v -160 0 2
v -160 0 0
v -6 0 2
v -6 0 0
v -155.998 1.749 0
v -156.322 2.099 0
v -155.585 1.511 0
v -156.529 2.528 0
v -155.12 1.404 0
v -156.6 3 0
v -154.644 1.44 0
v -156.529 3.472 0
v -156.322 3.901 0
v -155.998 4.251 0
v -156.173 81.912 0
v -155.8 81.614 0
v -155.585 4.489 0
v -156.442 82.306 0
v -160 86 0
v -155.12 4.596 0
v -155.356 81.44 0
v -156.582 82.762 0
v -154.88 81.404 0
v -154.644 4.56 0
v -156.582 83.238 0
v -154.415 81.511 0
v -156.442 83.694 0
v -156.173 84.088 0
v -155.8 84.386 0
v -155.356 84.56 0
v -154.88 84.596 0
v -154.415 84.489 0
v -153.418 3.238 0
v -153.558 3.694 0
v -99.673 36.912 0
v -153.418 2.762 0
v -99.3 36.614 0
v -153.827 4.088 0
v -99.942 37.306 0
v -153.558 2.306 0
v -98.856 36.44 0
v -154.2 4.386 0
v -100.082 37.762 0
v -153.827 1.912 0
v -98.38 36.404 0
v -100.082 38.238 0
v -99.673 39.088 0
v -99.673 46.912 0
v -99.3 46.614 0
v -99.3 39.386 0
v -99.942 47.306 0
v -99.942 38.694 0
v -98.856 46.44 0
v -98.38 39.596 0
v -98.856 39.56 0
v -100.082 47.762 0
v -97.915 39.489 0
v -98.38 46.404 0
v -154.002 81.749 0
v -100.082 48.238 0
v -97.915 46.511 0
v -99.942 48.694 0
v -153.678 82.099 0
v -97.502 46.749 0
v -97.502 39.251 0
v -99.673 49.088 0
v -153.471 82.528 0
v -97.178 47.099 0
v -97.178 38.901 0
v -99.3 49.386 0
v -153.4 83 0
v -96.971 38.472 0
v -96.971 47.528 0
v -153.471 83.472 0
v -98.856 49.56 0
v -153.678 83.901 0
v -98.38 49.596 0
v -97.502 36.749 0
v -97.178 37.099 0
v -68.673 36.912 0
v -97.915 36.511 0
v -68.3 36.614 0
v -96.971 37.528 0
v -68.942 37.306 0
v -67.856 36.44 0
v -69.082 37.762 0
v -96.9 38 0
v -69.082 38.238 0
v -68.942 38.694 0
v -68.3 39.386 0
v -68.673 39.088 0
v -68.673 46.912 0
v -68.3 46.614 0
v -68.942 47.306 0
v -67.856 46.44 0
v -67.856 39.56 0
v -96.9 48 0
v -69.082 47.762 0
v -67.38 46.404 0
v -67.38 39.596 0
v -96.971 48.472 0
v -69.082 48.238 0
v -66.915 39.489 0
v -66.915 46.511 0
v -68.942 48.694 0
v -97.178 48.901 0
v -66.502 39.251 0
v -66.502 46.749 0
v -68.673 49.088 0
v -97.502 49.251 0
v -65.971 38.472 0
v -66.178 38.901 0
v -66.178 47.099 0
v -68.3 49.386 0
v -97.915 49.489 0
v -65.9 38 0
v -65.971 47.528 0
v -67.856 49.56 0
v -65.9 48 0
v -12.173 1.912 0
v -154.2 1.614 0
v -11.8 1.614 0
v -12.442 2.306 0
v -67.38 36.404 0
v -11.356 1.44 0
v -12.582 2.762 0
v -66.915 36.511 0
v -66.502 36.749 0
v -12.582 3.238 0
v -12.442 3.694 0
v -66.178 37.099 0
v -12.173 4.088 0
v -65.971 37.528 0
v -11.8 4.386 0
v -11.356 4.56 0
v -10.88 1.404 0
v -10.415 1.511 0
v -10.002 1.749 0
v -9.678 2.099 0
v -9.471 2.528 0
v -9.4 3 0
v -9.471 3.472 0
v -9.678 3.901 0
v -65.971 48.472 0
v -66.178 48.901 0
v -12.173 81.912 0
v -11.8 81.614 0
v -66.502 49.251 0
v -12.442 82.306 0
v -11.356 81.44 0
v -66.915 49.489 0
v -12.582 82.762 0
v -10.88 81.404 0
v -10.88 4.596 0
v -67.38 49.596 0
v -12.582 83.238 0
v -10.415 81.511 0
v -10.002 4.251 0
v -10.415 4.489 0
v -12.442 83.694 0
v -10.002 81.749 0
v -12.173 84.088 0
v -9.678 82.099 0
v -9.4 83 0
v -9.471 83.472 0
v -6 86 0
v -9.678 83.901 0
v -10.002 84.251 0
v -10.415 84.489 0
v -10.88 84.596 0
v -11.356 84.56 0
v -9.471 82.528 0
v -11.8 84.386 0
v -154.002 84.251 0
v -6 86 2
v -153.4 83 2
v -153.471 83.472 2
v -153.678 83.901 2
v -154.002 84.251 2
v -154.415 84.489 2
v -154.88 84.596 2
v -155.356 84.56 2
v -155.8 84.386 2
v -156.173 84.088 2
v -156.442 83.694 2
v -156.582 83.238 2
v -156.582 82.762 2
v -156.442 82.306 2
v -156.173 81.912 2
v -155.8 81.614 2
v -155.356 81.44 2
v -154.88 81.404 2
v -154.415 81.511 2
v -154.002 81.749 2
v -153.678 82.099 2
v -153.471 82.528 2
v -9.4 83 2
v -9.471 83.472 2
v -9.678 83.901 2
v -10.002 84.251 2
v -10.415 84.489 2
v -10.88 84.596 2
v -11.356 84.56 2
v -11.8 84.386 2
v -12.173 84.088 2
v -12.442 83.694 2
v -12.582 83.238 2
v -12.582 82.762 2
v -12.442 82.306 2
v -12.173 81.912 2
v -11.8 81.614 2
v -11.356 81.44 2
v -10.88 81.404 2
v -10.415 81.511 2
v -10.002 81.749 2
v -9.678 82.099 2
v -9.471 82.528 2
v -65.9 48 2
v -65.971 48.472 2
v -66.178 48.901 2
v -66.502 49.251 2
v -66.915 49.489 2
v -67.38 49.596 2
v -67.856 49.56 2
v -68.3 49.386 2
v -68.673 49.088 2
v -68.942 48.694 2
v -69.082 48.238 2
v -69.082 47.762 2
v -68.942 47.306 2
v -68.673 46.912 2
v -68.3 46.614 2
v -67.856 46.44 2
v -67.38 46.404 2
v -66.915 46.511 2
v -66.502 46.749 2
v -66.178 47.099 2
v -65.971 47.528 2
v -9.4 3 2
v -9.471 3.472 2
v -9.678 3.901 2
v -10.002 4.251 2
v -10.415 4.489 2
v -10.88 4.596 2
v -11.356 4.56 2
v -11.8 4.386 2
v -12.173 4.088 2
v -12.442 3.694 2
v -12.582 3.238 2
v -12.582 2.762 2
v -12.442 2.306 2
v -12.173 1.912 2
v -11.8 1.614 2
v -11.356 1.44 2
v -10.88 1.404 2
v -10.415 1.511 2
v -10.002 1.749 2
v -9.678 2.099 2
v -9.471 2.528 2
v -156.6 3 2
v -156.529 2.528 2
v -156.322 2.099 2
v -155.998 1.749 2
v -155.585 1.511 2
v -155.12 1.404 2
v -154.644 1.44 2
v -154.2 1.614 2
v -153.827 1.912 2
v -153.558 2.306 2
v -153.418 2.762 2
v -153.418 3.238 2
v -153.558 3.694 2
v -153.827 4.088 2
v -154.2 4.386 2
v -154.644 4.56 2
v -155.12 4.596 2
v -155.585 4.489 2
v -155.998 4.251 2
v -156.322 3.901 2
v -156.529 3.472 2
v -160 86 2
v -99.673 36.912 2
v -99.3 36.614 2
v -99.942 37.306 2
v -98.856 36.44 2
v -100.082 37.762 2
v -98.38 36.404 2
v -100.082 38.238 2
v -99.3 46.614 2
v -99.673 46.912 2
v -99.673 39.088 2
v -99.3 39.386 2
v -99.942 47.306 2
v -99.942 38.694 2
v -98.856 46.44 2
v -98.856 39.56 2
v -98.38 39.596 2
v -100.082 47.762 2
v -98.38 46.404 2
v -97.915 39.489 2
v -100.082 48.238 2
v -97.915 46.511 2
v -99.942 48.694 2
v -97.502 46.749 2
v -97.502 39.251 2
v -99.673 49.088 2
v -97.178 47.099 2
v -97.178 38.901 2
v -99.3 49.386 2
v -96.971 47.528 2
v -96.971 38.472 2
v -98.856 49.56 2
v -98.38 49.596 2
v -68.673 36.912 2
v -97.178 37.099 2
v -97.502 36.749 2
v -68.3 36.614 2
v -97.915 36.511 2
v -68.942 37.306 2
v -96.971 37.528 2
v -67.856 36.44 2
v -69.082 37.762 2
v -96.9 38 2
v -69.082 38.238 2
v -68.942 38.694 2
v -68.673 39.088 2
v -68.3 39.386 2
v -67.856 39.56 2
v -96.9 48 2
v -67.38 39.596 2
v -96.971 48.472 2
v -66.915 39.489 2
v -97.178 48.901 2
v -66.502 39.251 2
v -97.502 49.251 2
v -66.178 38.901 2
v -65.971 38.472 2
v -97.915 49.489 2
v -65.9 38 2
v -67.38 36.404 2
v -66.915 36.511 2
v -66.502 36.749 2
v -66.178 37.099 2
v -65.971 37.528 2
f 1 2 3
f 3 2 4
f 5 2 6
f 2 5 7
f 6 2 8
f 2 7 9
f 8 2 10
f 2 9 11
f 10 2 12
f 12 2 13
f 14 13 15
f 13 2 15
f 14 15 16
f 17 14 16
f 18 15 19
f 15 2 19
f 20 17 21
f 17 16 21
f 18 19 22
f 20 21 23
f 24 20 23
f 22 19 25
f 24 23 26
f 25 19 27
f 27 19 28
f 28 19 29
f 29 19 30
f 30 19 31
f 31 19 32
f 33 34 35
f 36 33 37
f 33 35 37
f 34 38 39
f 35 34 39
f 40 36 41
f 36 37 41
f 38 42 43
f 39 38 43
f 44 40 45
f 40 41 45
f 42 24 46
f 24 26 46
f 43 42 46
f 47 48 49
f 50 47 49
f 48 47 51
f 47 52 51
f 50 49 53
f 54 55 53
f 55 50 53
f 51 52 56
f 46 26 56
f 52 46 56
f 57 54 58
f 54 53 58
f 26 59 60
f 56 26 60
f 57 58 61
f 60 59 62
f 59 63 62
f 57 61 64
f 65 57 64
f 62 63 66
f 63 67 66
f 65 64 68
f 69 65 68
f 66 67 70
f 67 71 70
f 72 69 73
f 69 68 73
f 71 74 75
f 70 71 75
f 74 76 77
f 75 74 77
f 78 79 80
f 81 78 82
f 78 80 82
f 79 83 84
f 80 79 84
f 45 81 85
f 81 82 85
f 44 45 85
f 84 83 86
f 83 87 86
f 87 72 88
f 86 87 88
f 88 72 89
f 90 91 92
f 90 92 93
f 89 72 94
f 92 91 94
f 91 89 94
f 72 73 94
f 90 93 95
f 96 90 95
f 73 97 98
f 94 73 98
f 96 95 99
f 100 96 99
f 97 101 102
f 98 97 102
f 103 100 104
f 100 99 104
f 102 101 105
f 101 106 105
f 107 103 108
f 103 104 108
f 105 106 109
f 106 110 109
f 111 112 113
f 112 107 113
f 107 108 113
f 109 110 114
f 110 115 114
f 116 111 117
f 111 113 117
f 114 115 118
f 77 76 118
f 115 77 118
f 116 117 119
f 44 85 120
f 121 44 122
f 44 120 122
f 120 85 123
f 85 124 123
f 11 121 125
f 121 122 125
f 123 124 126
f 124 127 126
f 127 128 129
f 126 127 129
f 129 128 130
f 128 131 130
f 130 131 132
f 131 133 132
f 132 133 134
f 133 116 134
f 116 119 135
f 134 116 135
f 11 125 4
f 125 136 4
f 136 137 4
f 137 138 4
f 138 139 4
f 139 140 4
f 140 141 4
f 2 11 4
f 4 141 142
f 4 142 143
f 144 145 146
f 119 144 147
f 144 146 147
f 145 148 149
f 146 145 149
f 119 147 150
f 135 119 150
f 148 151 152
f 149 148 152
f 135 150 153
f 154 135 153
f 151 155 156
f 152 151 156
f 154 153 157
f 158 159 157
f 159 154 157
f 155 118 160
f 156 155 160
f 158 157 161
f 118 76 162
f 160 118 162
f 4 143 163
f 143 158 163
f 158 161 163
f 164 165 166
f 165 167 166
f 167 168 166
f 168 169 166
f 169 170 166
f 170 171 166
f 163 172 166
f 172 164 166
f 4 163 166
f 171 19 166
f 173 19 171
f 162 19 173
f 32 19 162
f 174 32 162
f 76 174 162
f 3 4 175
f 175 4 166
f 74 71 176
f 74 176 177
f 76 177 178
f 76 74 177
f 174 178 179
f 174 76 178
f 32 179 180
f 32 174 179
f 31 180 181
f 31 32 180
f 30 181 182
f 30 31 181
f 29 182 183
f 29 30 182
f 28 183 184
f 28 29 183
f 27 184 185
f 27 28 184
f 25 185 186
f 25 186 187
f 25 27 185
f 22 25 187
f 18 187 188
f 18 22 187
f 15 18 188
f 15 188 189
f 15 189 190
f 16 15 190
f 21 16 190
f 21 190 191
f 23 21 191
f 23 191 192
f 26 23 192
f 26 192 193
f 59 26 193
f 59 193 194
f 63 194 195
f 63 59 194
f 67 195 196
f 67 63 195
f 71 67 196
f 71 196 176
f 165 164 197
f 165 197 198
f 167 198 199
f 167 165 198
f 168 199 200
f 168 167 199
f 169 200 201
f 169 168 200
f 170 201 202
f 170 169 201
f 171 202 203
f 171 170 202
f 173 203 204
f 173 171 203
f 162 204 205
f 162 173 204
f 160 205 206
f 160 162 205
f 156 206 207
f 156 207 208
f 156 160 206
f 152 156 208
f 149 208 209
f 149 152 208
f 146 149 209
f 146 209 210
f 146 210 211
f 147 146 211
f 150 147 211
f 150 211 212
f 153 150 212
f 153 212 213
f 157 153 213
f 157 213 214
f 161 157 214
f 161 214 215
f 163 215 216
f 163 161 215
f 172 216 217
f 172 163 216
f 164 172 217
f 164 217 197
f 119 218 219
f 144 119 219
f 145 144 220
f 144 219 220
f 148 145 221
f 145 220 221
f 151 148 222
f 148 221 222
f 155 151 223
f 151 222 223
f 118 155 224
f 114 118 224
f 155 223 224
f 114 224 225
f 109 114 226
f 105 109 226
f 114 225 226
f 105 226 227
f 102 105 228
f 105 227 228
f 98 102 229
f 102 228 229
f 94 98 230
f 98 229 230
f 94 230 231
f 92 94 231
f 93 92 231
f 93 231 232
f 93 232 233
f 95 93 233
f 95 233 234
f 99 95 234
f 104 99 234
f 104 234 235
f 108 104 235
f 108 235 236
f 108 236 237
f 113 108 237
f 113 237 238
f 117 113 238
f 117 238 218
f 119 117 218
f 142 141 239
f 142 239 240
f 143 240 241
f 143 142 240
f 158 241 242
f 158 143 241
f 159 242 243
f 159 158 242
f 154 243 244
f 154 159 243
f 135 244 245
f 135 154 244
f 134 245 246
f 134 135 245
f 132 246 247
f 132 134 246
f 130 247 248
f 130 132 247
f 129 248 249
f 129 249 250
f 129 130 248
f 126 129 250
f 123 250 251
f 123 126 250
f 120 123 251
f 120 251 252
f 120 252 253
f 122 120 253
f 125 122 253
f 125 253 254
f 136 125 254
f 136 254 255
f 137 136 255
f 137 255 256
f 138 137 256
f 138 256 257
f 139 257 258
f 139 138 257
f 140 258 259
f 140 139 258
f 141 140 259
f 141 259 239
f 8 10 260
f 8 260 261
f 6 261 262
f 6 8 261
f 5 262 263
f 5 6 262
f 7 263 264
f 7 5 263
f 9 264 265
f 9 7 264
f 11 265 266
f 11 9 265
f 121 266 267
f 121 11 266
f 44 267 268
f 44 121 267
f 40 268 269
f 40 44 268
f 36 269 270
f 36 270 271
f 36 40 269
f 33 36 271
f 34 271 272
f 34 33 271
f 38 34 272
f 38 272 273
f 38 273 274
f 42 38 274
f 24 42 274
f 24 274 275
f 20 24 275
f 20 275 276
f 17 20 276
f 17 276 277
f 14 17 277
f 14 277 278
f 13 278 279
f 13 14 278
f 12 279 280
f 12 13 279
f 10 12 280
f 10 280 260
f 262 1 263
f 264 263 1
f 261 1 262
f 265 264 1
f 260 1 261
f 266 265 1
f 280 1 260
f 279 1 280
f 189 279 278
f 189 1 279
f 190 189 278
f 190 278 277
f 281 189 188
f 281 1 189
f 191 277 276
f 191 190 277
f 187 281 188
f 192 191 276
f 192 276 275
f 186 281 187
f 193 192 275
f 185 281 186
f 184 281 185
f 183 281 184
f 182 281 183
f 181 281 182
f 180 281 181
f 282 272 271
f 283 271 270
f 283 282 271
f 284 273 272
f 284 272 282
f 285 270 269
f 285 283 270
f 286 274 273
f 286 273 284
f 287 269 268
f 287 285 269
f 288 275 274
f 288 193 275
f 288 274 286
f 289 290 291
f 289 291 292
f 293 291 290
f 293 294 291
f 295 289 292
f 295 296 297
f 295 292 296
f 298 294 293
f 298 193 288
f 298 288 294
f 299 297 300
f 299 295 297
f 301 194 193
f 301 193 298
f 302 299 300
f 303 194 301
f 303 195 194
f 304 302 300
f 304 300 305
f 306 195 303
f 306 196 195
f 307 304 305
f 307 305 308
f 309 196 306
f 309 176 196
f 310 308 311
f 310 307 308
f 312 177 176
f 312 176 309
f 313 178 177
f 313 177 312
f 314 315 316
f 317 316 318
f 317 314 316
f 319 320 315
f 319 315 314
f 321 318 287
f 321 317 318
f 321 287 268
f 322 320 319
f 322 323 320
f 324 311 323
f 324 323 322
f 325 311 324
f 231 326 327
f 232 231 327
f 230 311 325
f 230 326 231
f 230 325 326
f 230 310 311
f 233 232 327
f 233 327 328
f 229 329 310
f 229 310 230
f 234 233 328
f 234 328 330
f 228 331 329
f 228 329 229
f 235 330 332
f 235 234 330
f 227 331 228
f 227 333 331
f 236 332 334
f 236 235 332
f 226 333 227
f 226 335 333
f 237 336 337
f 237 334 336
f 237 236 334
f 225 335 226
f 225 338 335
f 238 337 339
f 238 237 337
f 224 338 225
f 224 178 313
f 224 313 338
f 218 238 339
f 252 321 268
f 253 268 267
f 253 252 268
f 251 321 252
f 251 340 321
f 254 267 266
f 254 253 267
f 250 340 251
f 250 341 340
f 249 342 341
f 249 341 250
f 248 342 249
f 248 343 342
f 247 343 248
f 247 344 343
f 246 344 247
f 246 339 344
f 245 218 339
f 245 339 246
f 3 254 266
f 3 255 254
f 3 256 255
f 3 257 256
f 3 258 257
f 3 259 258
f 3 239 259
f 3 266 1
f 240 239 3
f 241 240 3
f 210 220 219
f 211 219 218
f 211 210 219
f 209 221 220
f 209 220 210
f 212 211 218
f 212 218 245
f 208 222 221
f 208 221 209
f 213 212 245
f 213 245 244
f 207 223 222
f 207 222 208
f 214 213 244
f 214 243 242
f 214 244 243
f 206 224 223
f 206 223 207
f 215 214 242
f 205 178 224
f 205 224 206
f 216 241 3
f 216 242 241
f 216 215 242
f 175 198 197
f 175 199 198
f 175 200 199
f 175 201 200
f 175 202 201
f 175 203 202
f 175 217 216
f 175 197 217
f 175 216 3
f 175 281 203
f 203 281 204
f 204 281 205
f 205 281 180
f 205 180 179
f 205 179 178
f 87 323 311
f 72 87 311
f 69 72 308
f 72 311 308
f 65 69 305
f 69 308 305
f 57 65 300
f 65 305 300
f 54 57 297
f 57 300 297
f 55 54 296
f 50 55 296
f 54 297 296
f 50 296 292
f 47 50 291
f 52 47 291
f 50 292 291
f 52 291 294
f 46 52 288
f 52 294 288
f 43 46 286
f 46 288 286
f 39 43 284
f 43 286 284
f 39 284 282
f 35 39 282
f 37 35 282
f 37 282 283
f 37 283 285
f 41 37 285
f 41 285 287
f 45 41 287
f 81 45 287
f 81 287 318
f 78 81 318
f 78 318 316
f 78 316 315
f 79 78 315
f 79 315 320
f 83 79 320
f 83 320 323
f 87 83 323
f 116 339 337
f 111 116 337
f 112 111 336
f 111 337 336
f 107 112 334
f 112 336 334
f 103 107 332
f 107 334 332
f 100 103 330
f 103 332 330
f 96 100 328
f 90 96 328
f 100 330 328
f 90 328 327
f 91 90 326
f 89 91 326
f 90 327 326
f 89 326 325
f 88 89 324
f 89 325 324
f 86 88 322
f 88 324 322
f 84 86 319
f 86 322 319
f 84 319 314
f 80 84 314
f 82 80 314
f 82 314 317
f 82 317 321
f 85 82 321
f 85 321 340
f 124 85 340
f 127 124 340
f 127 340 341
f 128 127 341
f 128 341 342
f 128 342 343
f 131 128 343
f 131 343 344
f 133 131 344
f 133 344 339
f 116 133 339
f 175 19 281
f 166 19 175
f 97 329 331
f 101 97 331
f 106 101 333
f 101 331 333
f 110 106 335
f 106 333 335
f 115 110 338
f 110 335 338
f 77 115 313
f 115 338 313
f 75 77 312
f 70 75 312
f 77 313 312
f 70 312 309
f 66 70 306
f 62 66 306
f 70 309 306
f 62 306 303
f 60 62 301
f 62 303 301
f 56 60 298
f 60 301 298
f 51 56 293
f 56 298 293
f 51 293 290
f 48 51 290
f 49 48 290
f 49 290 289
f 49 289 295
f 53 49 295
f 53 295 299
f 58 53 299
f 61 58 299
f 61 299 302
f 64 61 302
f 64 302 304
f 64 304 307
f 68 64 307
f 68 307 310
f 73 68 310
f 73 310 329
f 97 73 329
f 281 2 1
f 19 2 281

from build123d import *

# Parameters (mm, degrees)
SKETCH_1_W          = 154
SKETCH_1_H          = 86
SKETCH_1_R          = 1.6
EXTRUDE_1_DEPTH     = 2
CUT_EXTRUDE_1_REACH = 183.659
SKETCH_2_R          = 1.6


with BuildPart() as part:
    # 草图1 → 凸台-拉伸1 (new body)
    with BuildSketch(Plane.XY):
        with Locations((-83, 43)):
            Rectangle(SKETCH_1_W, SKETCH_1_H)
        with Locations(Location((-155, 3, 0), (0, 0, 180))):
            Circle(SKETCH_1_R, mode=Mode.SUBTRACT)
        with Locations((-11, 3)):
            Circle(SKETCH_1_R, mode=Mode.SUBTRACT)
        with Locations((-11, 83)):
            Circle(SKETCH_1_R, mode=Mode.SUBTRACT)
        with Locations((-155, 83)):
            Circle(SKETCH_1_R, mode=Mode.SUBTRACT)
    extrude(amount=EXTRUDE_1_DEPTH)

    # 草图2 → 切除-拉伸1 (cut, up to next)
    with BuildSketch(Plane.XY.offset(2), mode=Mode.PRIVATE) as cut_extrude_1_sk1:
        with Locations((-98.5, 48)):
            Circle(SKETCH_2_R)
    cut_extrude_1_tool1 = extrude(cut_extrude_1_sk1.sketch, amount=-CUT_EXTRUDE_1_REACH, mode=Mode.PRIVATE) & part.part
    # 草图2 → 切除-拉伸1 (cut, up to next)
    with BuildSketch(Plane.XY.offset(2), mode=Mode.PRIVATE) as cut_extrude_1_sk2:
        with Locations((-67.5, 48)):
            Circle(SKETCH_2_R)
    cut_extrude_1_tool2 = extrude(cut_extrude_1_sk2.sketch, amount=-CUT_EXTRUDE_1_REACH, mode=Mode.PRIVATE) & part.part
    # 草图2 → 切除-拉伸1 (cut, up to next)
    with BuildSketch(Plane.XY.offset(2), mode=Mode.PRIVATE) as cut_extrude_1_sk3:
        with Locations((-67.5, 38)):
            Circle(SKETCH_2_R)
    cut_extrude_1_tool3 = extrude(cut_extrude_1_sk3.sketch, amount=-CUT_EXTRUDE_1_REACH, mode=Mode.PRIVATE) & part.part
    # 草图2 → 切除-拉伸1 (cut, up to next)
    with BuildSketch(Plane.XY.offset(2), mode=Mode.PRIVATE) as cut_extrude_1_sk4:
        with Locations((-98.5, 38)):
            Circle(SKETCH_2_R)
    cut_extrude_1_tool4 = extrude(cut_extrude_1_sk4.sketch, amount=-CUT_EXTRUDE_1_REACH, mode=Mode.PRIVATE) & part.part
    add(cut_extrude_1_tool1.solids().sort_by_distance((-98.5, 48, 2))[0], mode=Mode.SUBTRACT)
    add(cut_extrude_1_tool2.solids().sort_by_distance((-67.5, 48, 2))[0], mode=Mode.SUBTRACT)
    add(cut_extrude_1_tool3.solids().sort_by_distance((-67.5, 38, 2))[0], mode=Mode.SUBTRACT)
    add(cut_extrude_1_tool4.solids().sort_by_distance((-98.5, 38, 2))[0], mode=Mode.SUBTRACT)


solid = part.part
